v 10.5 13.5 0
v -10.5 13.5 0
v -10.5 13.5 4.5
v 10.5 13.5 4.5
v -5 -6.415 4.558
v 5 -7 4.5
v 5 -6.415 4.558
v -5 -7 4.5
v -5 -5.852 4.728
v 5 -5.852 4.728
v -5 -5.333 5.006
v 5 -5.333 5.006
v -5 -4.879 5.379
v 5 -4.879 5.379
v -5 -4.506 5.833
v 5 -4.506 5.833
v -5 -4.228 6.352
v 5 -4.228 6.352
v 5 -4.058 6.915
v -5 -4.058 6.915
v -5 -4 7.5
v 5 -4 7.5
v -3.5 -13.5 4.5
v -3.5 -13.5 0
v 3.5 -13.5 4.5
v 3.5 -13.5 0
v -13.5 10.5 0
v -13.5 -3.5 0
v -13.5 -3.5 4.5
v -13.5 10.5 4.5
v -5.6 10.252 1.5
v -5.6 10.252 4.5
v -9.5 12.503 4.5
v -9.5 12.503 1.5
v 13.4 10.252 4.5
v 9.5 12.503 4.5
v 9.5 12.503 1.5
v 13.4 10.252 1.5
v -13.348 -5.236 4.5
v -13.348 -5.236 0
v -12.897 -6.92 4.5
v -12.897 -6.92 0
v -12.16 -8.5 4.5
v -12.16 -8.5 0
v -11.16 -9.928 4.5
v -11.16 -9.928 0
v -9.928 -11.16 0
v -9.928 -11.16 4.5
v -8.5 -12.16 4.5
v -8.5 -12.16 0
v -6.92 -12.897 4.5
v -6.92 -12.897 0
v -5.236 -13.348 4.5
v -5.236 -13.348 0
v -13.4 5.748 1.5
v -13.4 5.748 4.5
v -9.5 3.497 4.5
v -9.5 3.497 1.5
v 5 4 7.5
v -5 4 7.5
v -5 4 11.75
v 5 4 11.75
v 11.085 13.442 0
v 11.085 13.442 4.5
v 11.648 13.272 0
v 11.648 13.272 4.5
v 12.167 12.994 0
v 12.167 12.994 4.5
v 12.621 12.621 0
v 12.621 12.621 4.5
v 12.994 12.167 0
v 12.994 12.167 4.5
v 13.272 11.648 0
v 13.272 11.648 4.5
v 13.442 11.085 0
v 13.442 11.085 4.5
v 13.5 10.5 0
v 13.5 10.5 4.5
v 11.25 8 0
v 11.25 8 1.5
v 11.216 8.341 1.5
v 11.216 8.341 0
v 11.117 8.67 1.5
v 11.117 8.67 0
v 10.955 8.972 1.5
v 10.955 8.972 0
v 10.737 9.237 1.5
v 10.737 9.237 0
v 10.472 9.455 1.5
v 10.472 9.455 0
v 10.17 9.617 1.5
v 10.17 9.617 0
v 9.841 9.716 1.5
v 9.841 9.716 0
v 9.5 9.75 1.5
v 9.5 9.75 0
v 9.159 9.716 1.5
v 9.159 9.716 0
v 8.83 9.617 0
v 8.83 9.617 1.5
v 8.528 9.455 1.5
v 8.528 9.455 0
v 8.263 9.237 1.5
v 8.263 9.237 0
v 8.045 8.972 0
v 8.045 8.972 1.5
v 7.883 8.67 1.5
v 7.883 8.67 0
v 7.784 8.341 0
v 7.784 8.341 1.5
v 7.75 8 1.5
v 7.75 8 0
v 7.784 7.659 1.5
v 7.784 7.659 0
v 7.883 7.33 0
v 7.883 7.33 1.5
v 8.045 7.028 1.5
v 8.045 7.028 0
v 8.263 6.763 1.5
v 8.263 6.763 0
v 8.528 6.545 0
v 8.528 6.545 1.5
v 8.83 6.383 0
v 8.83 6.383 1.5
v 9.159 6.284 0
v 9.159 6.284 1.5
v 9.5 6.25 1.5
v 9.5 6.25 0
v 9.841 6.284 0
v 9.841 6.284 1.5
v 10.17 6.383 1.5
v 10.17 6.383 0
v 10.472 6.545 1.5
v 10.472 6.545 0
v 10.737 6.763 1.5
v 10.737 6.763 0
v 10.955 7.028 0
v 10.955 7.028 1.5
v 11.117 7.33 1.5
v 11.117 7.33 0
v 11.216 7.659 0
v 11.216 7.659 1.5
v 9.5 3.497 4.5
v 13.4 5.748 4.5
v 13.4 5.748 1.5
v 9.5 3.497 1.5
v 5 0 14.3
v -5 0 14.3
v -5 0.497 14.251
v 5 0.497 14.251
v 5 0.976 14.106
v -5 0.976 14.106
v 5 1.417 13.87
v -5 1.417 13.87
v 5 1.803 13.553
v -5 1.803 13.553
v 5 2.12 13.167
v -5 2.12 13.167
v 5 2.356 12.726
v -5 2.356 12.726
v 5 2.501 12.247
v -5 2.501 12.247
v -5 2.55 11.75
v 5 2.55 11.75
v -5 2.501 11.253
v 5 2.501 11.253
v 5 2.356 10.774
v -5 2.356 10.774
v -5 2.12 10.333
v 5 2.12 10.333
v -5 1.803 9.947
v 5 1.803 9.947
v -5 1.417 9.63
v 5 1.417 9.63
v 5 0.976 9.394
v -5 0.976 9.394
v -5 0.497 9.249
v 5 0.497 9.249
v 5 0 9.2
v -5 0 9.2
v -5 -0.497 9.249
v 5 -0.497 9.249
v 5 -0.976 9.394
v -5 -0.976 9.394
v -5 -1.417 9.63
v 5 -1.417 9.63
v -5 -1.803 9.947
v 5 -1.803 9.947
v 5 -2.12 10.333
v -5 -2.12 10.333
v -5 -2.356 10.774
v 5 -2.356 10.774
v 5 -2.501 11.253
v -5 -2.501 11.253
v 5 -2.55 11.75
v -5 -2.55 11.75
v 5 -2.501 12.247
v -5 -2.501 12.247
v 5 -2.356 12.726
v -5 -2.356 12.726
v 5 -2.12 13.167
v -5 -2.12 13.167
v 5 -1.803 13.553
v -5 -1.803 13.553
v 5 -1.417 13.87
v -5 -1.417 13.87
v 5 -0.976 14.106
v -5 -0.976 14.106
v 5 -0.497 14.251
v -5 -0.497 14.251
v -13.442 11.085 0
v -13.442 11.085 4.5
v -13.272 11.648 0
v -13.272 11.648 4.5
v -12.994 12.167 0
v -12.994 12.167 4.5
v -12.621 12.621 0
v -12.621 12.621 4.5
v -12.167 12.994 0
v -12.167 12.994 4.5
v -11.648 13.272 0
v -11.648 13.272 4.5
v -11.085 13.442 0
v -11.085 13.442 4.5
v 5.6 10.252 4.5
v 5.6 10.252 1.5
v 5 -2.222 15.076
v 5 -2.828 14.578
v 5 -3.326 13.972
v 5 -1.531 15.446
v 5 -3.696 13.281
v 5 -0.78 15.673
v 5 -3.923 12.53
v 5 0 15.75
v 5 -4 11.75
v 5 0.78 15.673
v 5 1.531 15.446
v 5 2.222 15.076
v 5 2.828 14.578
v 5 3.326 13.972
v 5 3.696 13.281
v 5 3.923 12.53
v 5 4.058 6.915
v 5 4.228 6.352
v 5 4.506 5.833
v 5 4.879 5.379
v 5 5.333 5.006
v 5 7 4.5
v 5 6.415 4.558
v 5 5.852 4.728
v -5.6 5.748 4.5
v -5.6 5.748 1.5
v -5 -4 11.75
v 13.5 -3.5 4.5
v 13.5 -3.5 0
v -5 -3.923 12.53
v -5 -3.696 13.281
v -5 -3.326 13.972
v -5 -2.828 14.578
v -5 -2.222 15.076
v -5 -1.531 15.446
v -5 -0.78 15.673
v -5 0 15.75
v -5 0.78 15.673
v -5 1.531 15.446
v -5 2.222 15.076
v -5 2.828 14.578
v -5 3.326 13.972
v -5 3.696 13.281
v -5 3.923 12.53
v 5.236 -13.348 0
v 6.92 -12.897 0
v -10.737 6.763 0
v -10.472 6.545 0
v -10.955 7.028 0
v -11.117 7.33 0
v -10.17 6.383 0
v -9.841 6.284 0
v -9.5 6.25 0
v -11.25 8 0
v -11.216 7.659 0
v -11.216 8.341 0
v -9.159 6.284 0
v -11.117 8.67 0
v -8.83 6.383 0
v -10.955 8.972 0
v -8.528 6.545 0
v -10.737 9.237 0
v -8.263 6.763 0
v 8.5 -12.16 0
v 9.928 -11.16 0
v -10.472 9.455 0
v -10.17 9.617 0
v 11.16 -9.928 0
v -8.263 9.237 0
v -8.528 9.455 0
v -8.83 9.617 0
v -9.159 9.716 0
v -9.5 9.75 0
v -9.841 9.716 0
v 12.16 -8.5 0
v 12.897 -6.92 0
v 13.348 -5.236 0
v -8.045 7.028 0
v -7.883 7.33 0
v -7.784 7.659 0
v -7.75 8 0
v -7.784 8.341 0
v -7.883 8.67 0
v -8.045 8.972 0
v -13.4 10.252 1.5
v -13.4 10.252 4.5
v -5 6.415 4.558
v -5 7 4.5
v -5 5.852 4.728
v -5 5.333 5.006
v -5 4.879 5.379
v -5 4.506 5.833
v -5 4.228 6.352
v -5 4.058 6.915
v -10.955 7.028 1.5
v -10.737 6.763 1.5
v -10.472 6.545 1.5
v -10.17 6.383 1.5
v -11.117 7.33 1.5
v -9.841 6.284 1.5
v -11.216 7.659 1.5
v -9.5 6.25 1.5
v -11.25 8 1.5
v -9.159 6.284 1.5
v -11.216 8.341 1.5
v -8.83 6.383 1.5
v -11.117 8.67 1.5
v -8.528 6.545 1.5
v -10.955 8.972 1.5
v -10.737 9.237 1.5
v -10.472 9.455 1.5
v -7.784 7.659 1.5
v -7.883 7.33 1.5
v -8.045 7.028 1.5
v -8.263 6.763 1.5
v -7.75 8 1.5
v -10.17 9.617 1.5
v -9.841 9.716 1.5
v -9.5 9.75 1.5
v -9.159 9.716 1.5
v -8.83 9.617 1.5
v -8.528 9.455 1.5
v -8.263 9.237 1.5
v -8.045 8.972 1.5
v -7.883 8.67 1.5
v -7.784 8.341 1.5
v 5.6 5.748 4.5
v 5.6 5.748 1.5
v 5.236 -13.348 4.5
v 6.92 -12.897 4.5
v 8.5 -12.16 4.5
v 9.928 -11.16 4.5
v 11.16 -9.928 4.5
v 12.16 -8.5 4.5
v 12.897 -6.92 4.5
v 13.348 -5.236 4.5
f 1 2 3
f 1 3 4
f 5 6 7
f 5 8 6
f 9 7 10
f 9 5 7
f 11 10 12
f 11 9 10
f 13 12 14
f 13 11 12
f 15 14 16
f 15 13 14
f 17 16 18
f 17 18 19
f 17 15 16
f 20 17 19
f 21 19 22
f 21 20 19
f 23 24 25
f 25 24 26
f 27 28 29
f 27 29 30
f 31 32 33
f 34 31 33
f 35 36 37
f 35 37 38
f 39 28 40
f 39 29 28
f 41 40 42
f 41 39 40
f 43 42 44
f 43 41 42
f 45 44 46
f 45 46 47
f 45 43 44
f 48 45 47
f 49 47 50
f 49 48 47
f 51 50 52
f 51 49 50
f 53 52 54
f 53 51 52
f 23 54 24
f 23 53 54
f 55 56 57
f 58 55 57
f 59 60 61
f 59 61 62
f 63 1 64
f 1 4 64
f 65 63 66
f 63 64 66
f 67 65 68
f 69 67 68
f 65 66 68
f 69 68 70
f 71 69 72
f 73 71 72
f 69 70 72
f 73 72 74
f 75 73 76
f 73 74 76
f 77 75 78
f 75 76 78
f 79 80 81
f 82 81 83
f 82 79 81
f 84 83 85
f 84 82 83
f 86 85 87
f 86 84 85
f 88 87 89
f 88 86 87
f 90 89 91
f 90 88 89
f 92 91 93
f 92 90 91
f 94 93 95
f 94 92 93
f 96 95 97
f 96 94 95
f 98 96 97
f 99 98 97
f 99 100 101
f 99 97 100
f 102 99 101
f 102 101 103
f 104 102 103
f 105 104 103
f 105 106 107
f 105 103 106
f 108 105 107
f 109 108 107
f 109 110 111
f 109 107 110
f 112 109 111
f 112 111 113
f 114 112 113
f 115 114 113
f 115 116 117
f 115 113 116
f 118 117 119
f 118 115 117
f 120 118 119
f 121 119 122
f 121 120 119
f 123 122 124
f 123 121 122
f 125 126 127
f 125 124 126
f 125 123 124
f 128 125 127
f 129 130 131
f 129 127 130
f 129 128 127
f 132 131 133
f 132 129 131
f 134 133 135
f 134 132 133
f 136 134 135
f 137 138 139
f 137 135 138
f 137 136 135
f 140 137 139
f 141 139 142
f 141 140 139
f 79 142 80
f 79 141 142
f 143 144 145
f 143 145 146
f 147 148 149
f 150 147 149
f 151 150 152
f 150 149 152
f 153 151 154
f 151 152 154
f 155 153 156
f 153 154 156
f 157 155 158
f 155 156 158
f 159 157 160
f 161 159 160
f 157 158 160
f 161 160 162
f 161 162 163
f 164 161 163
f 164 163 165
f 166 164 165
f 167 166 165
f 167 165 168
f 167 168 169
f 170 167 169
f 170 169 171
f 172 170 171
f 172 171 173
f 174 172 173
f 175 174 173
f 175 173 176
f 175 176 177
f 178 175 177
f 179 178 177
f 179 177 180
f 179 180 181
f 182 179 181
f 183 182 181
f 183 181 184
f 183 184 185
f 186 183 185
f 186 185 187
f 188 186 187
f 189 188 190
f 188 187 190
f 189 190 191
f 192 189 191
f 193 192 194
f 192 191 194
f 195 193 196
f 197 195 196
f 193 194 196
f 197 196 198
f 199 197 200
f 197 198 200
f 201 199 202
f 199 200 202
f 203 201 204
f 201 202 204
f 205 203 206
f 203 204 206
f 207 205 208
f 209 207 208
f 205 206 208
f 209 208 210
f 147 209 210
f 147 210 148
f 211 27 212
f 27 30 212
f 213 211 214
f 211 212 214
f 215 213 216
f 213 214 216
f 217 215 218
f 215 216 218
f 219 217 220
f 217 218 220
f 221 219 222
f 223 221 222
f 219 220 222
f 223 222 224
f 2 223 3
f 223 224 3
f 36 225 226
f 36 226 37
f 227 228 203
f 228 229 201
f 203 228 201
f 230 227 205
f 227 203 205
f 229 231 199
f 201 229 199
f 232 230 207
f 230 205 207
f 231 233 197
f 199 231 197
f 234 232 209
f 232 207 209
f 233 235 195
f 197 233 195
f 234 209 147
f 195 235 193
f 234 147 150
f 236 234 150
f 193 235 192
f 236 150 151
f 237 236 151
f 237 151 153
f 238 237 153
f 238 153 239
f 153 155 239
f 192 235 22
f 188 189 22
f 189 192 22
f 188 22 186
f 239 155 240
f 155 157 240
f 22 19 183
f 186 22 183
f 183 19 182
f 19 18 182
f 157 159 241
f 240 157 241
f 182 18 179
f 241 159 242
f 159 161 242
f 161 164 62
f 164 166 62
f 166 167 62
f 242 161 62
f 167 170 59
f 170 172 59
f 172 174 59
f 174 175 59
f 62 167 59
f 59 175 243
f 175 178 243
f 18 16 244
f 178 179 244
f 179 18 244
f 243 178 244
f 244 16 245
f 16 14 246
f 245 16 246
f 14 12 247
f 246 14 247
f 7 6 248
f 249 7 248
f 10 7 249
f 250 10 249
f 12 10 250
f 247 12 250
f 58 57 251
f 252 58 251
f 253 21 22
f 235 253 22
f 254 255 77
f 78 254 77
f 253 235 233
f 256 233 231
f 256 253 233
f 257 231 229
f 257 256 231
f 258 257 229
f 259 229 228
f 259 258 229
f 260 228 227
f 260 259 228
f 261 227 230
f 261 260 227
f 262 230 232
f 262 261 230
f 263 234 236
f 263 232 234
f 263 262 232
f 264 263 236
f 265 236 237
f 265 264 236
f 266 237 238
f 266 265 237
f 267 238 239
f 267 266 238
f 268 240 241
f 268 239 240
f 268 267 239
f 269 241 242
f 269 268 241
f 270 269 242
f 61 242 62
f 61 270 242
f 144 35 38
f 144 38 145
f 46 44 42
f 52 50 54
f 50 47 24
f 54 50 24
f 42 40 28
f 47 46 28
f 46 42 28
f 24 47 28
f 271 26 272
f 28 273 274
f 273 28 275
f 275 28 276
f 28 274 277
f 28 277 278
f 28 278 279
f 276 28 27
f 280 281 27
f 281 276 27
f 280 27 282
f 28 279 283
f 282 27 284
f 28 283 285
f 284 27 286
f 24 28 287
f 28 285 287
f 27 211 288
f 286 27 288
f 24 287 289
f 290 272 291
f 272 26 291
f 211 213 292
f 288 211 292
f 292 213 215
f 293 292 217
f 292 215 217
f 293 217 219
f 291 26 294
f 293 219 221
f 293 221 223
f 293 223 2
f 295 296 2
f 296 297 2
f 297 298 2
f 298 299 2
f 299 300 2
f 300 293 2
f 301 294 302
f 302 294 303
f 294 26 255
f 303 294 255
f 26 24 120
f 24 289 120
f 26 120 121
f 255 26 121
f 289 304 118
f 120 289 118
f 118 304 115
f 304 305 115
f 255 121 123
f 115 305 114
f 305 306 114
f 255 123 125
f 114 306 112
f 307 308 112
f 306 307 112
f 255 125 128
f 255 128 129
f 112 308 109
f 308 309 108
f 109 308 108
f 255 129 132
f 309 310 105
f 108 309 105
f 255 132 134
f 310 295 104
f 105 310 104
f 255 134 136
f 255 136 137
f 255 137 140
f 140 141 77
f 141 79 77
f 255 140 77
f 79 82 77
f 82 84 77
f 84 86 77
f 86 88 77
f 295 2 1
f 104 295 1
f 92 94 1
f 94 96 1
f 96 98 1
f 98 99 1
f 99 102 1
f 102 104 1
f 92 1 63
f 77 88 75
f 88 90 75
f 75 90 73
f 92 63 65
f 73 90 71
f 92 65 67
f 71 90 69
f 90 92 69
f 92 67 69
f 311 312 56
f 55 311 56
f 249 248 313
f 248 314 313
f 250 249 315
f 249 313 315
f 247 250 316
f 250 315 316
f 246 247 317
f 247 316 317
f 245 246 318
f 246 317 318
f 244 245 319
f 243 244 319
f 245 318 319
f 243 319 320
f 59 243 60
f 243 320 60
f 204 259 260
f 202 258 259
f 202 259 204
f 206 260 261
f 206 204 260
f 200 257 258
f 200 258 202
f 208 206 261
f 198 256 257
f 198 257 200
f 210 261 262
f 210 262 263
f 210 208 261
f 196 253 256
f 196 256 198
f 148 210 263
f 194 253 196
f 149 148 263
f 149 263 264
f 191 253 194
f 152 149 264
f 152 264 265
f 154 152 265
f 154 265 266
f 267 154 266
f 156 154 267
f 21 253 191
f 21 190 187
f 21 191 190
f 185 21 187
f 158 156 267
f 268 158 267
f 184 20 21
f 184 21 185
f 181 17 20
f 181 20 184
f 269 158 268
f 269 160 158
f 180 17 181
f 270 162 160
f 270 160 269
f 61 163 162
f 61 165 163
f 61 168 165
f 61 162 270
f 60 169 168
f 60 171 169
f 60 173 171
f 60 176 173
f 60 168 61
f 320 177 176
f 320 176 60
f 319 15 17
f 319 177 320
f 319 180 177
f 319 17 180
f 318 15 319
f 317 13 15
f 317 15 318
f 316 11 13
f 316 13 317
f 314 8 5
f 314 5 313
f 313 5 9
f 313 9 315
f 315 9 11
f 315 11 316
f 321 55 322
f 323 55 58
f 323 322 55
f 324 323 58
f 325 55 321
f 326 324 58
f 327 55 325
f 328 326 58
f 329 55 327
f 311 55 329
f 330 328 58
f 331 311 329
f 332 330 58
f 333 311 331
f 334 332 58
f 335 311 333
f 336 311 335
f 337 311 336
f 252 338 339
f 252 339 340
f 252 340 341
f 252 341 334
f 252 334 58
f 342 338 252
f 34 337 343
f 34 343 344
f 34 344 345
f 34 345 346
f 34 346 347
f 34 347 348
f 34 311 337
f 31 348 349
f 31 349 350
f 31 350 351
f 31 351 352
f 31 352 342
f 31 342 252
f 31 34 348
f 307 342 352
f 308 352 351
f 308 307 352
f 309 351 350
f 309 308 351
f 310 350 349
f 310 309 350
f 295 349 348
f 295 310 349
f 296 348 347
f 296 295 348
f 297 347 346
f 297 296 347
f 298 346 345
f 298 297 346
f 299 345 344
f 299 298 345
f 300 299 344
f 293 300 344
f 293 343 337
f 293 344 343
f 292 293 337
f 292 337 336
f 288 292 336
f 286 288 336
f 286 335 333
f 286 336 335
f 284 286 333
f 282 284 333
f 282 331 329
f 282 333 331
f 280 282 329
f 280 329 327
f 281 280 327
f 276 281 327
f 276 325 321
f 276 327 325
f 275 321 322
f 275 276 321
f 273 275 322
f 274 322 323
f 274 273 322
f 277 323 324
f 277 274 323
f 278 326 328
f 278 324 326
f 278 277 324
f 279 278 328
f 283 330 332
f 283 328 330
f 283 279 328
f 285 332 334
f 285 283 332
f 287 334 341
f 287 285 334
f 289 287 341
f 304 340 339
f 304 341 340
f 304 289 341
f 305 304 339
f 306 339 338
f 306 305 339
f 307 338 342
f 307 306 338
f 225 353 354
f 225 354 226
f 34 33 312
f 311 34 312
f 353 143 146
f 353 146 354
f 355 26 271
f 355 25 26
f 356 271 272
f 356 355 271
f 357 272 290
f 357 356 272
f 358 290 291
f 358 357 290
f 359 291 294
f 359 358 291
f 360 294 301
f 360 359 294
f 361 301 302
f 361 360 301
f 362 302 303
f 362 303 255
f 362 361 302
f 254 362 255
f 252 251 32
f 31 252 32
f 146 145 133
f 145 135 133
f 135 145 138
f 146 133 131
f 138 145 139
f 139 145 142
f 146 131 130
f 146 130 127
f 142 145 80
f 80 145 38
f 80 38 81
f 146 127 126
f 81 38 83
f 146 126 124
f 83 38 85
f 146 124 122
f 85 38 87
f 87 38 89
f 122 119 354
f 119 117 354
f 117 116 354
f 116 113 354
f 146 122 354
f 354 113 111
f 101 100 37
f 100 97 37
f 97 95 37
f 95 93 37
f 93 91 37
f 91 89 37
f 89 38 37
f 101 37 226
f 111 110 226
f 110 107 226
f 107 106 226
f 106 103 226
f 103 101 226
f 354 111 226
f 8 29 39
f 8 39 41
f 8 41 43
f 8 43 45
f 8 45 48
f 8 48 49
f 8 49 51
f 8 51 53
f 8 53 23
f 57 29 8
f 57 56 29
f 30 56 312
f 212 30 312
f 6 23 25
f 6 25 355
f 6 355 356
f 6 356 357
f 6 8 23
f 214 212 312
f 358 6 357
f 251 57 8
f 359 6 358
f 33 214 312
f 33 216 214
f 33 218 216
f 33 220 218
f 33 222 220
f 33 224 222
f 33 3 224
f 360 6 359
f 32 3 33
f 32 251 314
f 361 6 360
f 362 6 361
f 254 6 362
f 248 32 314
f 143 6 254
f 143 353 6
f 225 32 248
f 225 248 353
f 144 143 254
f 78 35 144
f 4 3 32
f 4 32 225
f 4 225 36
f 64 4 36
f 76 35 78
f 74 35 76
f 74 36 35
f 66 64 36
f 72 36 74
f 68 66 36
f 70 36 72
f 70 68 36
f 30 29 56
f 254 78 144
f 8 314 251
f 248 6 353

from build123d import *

# Parameters (mm, degrees)
SKETCH1_W           = 27
SKETCH1_H           = 27
SKETCH1_R           = 1.75
BOSS_EXTRUDE1_DEPTH = 4.5
SKETCH1_3_W         = 10
SKETCH1_3_H         = 8
BOSS_EXTRUDE2_DEPTH = 15.75
FILLET1_R           = 10
SKETCH2_R           = 2.55
CUT_EXTRUDE1_DEPTH  = 28.795008545
FILLET2_RADIUS      = 4
FILLET2_LENGTH      = 10
FILLET3_R           = 3
CUT_EXTRUDE2_DEPTH  = 3
FILLET6_R           = 3


with BuildPart() as part:
    # Sketch1 → Boss-Extrude1 (new body)
    with BuildSketch(Plane.XY):
        Rectangle(SKETCH1_W, SKETCH1_H)
        with Locations((-9.5, 8)):
            Circle(SKETCH1_R, mode=Mode.SUBTRACT)
        with Locations((9.5, 8)):
            Circle(SKETCH1_R, mode=Mode.SUBTRACT)
    extrude(amount=BOSS_EXTRUDE1_DEPTH)

    # Sketch1<3> → Boss-Extrude2 (add)
    with BuildSketch(Plane.XY):
        Rectangle(SKETCH1_3_W, SKETCH1_3_H)
    extrude(amount=BOSS_EXTRUDE2_DEPTH)

    # Fillet1
    fillet1_edges = [part.edges().sort_by_distance(p)[0] for p in [
        (-13.5, -13.5, 2.25),
        (13.5, -13.5, 2.25),
    ]]
    fillet(fillet1_edges, radius=FILLET1_R)

    # Sketch2 → Cut-Extrude1 (cut, through all)
    with BuildSketch(Plane.ZY.offset(5)):
        with Locations((11.75, 0)):
            Circle(SKETCH2_R)
    extrude(amount=-CUT_EXTRUDE1_DEPTH, mode=Mode.SUBTRACT)

    # Fillet2: full round fillet: the end face becomes a half cylinder, R = half its width
    fillet2_face = Plane((0, 0, 15.75), x_dir=(-1, 0, 0), z_dir=(0, 0, 1))  # on the end face: x along it, z out of the body
    fillet2_slab = fillet2_face.offset(-FILLET2_RADIUS / 2) * Box(FILLET2_LENGTH, 2 * FILLET2_RADIUS, FILLET2_RADIUS, mode=Mode.PRIVATE)  # the body's end, R deep
    fillet2_round = Plane((0, 0, 11.75), x_dir=(0, 0, 1), z_dir=(-1, 0, 0)) * Cylinder(FILLET2_RADIUS, FILLET2_LENGTH, mode=Mode.PRIVATE)  # its axis R under the face
    add(fillet2_slab - fillet2_round, mode=Mode.SUBTRACT)

    # Fillet3
    fillet3_edges = [part.edges().sort_by_distance(p)[0] for p in [
        (0, -4, 4.5),
        (0, 4, 4.5),
    ]]
    fillet(fillet3_edges, radius=FILLET3_R)

    # Sketch3 → Cut-Extrude2 (cut)
    with BuildSketch(Plane.XY.offset(4.5)):
        Polygon((-9.5, 12.5033321), (-13.4, 10.25166605), (-13.4, 5.74833395), (-9.5, 3.4966679), (-5.6, 5.74833395), (-5.6, 10.25166605), align=None)
        Polygon((5.6, 10.25166605), (9.5, 12.5033321), (13.4, 10.25166605), (13.4, 5.74833395), (9.5, 3.4966679), (5.6, 5.74833395), align=None)
    extrude(amount=-CUT_EXTRUDE2_DEPTH, mode=Mode.SUBTRACT)

    # Fillet6
    fillet6_edges = [part.edges().sort_by_distance(p)[0] for p in [
        (-13.5, 13.5, 2.25),
        (13.5, 13.5, 2.25),
    ]]
    fillet(fillet6_edges, radius=FILLET6_R)


solid = part.part
